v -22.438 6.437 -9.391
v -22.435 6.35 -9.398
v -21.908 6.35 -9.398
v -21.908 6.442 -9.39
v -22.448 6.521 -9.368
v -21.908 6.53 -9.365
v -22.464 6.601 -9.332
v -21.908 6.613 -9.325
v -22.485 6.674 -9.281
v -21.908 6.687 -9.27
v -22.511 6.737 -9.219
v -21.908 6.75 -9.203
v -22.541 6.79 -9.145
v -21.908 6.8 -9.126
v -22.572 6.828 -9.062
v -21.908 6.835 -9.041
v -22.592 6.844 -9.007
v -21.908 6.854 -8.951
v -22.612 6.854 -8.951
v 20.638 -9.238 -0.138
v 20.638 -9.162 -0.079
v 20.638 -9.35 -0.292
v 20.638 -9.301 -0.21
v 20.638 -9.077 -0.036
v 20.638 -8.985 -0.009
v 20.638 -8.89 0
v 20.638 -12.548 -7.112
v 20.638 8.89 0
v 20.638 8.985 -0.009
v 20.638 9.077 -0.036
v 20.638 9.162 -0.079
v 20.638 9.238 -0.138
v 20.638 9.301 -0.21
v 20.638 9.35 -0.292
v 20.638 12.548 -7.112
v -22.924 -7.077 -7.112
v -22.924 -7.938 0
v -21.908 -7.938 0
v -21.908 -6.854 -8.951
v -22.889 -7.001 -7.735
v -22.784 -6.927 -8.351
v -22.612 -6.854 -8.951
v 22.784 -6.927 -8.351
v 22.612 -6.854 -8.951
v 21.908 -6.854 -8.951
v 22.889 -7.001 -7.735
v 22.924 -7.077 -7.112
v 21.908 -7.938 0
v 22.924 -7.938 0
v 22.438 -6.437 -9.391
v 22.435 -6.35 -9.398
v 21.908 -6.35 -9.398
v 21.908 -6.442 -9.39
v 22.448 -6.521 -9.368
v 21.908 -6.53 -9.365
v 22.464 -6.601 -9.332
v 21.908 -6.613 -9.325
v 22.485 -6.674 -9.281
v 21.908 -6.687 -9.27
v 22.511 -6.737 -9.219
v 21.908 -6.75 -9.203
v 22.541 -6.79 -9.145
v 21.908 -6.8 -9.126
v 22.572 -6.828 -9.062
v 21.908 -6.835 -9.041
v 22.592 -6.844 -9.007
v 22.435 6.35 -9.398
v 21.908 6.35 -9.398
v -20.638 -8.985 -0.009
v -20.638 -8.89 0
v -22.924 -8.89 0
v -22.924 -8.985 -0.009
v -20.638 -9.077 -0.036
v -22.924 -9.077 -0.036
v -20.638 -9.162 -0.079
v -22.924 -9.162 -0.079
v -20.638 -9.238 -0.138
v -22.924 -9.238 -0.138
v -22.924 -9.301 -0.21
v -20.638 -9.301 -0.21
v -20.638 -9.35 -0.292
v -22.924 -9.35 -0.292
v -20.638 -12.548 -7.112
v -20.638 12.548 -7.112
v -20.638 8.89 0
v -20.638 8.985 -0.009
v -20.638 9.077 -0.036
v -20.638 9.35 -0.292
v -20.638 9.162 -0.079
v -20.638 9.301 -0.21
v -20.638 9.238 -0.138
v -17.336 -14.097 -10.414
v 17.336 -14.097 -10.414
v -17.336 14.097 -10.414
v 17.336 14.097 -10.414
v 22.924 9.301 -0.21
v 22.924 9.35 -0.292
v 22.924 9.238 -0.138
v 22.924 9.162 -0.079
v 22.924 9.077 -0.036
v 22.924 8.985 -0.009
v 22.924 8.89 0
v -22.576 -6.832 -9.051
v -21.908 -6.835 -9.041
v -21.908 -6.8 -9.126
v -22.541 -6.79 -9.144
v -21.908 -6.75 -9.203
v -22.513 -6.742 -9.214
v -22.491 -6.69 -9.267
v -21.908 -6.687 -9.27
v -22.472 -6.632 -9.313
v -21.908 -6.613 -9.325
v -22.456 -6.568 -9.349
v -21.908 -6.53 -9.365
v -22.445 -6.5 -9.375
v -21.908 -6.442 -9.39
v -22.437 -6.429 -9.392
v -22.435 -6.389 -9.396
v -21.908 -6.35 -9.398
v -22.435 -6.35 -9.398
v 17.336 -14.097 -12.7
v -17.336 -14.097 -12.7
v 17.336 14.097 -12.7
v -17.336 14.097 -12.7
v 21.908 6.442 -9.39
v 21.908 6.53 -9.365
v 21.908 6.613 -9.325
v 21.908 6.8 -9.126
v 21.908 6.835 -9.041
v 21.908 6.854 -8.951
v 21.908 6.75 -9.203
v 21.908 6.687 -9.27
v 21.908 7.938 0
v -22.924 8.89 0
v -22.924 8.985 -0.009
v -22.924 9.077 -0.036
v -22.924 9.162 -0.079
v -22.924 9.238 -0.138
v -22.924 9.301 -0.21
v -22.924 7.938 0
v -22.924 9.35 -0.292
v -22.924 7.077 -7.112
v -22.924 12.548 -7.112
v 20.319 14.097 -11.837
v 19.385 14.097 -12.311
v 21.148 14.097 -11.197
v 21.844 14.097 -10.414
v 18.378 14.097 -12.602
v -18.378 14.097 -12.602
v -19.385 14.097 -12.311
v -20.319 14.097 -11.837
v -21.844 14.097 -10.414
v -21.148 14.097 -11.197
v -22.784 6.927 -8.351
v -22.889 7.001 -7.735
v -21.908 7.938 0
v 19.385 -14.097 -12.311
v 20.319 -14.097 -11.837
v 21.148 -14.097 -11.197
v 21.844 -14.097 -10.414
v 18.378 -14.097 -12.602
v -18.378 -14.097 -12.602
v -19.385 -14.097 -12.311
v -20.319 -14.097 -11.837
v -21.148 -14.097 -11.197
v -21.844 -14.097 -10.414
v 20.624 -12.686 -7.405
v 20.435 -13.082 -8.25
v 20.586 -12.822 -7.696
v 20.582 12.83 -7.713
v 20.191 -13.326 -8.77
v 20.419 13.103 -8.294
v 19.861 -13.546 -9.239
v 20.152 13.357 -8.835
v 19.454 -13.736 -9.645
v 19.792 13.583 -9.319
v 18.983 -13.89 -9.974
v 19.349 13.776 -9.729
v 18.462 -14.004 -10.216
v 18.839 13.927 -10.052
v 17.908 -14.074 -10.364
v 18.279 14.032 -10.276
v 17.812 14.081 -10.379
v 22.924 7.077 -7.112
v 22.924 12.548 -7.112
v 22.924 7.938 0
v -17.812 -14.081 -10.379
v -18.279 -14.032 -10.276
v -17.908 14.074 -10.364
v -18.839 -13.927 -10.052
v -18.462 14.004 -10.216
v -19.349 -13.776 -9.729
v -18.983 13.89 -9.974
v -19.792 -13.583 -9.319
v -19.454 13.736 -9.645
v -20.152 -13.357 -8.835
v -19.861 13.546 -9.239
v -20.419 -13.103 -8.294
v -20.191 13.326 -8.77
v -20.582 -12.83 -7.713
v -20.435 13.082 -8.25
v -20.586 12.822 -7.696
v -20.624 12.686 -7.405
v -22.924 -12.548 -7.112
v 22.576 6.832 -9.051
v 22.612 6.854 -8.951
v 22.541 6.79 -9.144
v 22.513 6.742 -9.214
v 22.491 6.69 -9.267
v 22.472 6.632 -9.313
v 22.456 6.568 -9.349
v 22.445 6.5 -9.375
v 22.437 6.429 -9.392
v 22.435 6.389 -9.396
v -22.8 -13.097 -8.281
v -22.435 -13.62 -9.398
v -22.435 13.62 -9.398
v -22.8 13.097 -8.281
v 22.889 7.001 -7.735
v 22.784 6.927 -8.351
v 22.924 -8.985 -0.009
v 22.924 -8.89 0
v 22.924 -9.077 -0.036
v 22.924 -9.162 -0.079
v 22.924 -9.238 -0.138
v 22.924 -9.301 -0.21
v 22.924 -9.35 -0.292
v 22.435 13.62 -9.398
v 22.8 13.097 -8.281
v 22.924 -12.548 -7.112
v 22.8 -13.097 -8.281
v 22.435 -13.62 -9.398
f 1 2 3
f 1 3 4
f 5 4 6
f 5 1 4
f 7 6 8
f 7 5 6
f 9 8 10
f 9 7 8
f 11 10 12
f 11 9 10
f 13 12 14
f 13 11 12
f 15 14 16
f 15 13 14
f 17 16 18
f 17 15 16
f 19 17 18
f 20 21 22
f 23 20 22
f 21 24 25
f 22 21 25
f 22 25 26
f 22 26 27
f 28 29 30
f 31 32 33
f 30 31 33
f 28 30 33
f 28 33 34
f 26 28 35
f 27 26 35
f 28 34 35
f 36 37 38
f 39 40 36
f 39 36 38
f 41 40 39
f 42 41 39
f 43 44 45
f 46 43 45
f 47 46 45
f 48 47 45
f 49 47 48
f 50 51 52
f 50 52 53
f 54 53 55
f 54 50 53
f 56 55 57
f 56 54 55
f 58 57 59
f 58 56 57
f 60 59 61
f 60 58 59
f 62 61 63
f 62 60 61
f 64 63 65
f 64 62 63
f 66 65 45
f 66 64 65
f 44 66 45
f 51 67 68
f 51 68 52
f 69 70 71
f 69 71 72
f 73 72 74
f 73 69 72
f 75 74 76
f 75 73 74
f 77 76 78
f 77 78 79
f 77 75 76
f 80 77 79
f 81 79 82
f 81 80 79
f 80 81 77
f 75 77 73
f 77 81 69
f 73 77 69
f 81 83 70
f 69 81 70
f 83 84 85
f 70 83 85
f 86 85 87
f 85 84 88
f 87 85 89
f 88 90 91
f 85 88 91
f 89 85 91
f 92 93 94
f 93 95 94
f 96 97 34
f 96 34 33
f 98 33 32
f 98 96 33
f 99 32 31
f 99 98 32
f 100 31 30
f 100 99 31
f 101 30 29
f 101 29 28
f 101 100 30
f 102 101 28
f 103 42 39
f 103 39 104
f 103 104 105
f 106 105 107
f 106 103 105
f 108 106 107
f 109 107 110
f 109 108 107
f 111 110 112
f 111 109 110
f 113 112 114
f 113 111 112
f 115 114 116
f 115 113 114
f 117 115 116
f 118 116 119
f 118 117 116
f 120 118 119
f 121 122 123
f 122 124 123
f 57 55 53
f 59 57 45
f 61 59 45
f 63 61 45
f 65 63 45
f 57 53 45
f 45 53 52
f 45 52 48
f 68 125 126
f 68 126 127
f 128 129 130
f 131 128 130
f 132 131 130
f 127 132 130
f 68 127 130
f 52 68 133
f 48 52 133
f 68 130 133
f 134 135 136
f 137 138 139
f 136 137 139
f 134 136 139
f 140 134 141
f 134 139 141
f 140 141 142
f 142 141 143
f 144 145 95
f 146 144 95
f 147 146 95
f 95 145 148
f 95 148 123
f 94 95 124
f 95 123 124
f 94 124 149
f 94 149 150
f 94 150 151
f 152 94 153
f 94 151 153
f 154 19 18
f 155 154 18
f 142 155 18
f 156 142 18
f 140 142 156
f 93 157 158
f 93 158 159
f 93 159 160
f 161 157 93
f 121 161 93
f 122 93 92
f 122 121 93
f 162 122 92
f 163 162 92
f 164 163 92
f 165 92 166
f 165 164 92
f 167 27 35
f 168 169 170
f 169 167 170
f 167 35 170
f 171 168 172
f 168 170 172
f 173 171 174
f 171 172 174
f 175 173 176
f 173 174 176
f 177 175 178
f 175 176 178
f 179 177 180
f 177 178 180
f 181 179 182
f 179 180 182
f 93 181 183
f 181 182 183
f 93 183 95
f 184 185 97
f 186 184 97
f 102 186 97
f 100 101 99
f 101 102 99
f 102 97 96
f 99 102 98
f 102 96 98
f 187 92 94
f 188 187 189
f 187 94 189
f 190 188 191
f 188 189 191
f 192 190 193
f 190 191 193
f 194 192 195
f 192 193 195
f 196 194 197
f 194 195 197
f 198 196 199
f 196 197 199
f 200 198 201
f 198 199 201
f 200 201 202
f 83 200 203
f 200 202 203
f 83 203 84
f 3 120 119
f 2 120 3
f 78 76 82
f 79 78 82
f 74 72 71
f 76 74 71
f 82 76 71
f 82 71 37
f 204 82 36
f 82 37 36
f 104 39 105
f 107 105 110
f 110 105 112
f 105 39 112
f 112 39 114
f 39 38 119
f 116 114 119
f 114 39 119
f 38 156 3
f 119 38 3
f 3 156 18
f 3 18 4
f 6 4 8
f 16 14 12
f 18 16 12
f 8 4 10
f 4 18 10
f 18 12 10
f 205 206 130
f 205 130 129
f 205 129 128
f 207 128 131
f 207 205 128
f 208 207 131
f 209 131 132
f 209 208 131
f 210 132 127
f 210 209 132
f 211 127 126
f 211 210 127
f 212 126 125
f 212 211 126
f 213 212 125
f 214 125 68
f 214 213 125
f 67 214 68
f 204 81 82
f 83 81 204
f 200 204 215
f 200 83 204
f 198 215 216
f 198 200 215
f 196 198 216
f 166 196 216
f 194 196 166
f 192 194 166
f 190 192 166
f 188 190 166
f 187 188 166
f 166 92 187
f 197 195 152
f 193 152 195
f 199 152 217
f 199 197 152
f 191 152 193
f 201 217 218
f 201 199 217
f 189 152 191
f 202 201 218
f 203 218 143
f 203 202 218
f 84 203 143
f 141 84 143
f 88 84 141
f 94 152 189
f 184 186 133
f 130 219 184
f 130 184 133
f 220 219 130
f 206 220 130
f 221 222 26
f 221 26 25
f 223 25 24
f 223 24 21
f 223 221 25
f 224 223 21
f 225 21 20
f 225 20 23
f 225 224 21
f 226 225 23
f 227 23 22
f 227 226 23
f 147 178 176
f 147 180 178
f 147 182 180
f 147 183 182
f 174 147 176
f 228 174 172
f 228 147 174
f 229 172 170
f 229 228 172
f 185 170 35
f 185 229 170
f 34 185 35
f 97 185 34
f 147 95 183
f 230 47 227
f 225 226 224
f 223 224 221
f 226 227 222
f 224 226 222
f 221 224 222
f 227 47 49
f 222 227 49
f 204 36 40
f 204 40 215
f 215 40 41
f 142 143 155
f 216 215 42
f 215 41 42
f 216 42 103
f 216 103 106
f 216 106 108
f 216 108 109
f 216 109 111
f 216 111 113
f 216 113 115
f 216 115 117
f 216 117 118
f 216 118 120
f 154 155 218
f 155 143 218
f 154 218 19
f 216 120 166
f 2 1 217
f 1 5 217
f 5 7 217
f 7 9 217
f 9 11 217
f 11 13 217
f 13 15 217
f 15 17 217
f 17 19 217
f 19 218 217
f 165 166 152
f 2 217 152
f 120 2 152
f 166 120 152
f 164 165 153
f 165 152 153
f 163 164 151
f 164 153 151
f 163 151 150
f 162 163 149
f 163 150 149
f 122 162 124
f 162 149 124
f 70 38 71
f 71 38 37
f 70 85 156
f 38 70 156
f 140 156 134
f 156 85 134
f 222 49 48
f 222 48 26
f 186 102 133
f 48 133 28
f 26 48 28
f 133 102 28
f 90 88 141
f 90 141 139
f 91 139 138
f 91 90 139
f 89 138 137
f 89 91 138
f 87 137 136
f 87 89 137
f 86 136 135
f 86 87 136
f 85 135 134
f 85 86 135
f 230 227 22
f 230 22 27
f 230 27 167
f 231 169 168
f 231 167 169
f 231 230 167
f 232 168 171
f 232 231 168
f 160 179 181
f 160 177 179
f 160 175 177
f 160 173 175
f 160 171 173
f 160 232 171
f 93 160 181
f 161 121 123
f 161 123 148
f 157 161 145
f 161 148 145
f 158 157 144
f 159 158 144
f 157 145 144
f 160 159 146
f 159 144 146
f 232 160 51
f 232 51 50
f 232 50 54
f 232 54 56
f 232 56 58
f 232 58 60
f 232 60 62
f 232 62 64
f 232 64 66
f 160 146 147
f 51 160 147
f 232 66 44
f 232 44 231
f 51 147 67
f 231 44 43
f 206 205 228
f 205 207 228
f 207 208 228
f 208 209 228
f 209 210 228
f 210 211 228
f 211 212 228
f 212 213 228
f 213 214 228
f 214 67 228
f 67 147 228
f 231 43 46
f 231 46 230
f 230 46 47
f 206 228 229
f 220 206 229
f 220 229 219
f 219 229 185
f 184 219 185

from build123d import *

# Parameters (mm, degrees)
BASE_EXTRUDE_THIN_DEPTH = 14.097
CUT_EXTRUDE1_DEPTH      = 46.847
CUT_EXTRUDE2_DEPTH      = 1.016
CUT_EXTRUDE3_DEPTH      = 1.016


with BuildPart() as part:
    # Sketch1 → Base-Extrude-Thin (new body, symmetric)
    with BuildSketch(Plane(origin=(0, 0, 0), x_dir=(1, 0, 0), z_dir=(0, 1, 0))):
        with BuildLine():
            Line((20.6375, 0), (20.6375, 7.112))
            ThreePointArc((20.6375, 7.112), (19.670366591, 9.446866591), (17.3355, 10.414))
            Line((17.3355, 10.414), (-17.3355, 10.414))
            ThreePointArc((-17.3355, 10.414), (-19.670366591, 9.446866591), (-20.6375, 7.112))
            Line((-20.6375, 7.112), (-20.6375, 0))
            Line((-20.6375, 0), (-22.9235, 0))
            Line((-22.9235, 0), (-22.9235, 7.112))
            ThreePointArc((-22.9235, 7.112), (-21.286812693, 11.063312693), (-17.3355, 12.7))
            Line((-17.3355, 12.7), (17.3355, 12.7))
            ThreePointArc((17.3355, 12.7), (21.286812693, 11.063312693), (22.9235, 7.112))
            Line((22.9235, 7.112), (22.9235, 0))
            Line((22.9235, 0), (20.6375, 0))
        make_face()
    extrude(amount=BASE_EXTRUDE_THIN_DEPTH, both=True)

    # Sketch2 → Cut-Extrude1 (cut, through all)
    with BuildSketch(Plane(origin=(22.9235, 0, 0), x_dir=(0, 0, -1), z_dir=(1, 0, 0))):
        with BuildLine():
            Line((73.891155103, 43.867726973), (10.414, 14.097))
            Line((10.414, 14.097), (0.292293676, 9.349929105))
            ThreePointArc((0.292293676, 9.349929105), (0.079256013, 9.162474941), (0, 8.89))
            Line((0, 8.89), (0, -8.89))
            ThreePointArc((0, -8.89), (0.079256013, -9.162474941), (0.292293676, -9.349929105))
            Line((0.292293676, -9.349929105), (10.414, -14.097))
            Line((10.414, -14.097), (73.891155103, -43.867726973))
            Line((73.891155103, -43.867726973), (-66.33217255, -43.867726973))
            Line((-66.33217255, -43.867726973), (-66.33217255, 43.867726973))
            Line((-66.33217255, 43.867726973), (73.891155103, 43.867726973))
        make_face()
    extrude(amount=-CUT_EXTRUDE1_DEPTH, mode=Mode.SUBTRACT)

    # Sketch4 → Cut-Extrude2 (cut)
    with BuildSketch(Plane(origin=(22.9235, 0, 0), x_dir=(0, 0, -1), z_dir=(1, 0, 0))):
        with BuildLine():
            Line((0, 7.9375), (8.951028719, 6.854320826))
            ThreePointArc((8.951028719, 6.854320826), (9.270175347, 6.686943178), (9.398, 6.35))
            Line((9.398, 6.35), (9.398, -6.35))
            ThreePointArc((9.398, -6.35), (9.270175347, -6.686943178), (8.951028719, -6.854320826))
            Line((8.951028719, -6.854320826), (0, -7.9375))
            Line((0, -7.9375), (0, 7.9375))
        make_face()
    extrude(amount=-CUT_EXTRUDE2_DEPTH, mode=Mode.SUBTRACT)

    # Sketch5 → Cut-Extrude3 (cut)
    with BuildSketch(Plane.ZY.offset(22.9235)):
        with BuildLine():
            Line((0, 7.9375), (0, -7.9375))
            Line((0, -7.9375), (-8.951028719, -6.854320826))
            ThreePointArc((-8.951028719, -6.854320826), (-9.270175347, -6.686943178), (-9.398, -6.35))
            Line((-9.398, -6.35), (-9.398, 6.35))
            ThreePointArc((-9.398, 6.35), (-9.270175347, 6.686943178), (-8.951028719, 6.854320826))
            Line((-8.951028719, 6.854320826), (0, 7.9375))
        make_face()
    extrude(amount=-CUT_EXTRUDE3_DEPTH, mode=Mode.SUBTRACT)


solid = part.part
